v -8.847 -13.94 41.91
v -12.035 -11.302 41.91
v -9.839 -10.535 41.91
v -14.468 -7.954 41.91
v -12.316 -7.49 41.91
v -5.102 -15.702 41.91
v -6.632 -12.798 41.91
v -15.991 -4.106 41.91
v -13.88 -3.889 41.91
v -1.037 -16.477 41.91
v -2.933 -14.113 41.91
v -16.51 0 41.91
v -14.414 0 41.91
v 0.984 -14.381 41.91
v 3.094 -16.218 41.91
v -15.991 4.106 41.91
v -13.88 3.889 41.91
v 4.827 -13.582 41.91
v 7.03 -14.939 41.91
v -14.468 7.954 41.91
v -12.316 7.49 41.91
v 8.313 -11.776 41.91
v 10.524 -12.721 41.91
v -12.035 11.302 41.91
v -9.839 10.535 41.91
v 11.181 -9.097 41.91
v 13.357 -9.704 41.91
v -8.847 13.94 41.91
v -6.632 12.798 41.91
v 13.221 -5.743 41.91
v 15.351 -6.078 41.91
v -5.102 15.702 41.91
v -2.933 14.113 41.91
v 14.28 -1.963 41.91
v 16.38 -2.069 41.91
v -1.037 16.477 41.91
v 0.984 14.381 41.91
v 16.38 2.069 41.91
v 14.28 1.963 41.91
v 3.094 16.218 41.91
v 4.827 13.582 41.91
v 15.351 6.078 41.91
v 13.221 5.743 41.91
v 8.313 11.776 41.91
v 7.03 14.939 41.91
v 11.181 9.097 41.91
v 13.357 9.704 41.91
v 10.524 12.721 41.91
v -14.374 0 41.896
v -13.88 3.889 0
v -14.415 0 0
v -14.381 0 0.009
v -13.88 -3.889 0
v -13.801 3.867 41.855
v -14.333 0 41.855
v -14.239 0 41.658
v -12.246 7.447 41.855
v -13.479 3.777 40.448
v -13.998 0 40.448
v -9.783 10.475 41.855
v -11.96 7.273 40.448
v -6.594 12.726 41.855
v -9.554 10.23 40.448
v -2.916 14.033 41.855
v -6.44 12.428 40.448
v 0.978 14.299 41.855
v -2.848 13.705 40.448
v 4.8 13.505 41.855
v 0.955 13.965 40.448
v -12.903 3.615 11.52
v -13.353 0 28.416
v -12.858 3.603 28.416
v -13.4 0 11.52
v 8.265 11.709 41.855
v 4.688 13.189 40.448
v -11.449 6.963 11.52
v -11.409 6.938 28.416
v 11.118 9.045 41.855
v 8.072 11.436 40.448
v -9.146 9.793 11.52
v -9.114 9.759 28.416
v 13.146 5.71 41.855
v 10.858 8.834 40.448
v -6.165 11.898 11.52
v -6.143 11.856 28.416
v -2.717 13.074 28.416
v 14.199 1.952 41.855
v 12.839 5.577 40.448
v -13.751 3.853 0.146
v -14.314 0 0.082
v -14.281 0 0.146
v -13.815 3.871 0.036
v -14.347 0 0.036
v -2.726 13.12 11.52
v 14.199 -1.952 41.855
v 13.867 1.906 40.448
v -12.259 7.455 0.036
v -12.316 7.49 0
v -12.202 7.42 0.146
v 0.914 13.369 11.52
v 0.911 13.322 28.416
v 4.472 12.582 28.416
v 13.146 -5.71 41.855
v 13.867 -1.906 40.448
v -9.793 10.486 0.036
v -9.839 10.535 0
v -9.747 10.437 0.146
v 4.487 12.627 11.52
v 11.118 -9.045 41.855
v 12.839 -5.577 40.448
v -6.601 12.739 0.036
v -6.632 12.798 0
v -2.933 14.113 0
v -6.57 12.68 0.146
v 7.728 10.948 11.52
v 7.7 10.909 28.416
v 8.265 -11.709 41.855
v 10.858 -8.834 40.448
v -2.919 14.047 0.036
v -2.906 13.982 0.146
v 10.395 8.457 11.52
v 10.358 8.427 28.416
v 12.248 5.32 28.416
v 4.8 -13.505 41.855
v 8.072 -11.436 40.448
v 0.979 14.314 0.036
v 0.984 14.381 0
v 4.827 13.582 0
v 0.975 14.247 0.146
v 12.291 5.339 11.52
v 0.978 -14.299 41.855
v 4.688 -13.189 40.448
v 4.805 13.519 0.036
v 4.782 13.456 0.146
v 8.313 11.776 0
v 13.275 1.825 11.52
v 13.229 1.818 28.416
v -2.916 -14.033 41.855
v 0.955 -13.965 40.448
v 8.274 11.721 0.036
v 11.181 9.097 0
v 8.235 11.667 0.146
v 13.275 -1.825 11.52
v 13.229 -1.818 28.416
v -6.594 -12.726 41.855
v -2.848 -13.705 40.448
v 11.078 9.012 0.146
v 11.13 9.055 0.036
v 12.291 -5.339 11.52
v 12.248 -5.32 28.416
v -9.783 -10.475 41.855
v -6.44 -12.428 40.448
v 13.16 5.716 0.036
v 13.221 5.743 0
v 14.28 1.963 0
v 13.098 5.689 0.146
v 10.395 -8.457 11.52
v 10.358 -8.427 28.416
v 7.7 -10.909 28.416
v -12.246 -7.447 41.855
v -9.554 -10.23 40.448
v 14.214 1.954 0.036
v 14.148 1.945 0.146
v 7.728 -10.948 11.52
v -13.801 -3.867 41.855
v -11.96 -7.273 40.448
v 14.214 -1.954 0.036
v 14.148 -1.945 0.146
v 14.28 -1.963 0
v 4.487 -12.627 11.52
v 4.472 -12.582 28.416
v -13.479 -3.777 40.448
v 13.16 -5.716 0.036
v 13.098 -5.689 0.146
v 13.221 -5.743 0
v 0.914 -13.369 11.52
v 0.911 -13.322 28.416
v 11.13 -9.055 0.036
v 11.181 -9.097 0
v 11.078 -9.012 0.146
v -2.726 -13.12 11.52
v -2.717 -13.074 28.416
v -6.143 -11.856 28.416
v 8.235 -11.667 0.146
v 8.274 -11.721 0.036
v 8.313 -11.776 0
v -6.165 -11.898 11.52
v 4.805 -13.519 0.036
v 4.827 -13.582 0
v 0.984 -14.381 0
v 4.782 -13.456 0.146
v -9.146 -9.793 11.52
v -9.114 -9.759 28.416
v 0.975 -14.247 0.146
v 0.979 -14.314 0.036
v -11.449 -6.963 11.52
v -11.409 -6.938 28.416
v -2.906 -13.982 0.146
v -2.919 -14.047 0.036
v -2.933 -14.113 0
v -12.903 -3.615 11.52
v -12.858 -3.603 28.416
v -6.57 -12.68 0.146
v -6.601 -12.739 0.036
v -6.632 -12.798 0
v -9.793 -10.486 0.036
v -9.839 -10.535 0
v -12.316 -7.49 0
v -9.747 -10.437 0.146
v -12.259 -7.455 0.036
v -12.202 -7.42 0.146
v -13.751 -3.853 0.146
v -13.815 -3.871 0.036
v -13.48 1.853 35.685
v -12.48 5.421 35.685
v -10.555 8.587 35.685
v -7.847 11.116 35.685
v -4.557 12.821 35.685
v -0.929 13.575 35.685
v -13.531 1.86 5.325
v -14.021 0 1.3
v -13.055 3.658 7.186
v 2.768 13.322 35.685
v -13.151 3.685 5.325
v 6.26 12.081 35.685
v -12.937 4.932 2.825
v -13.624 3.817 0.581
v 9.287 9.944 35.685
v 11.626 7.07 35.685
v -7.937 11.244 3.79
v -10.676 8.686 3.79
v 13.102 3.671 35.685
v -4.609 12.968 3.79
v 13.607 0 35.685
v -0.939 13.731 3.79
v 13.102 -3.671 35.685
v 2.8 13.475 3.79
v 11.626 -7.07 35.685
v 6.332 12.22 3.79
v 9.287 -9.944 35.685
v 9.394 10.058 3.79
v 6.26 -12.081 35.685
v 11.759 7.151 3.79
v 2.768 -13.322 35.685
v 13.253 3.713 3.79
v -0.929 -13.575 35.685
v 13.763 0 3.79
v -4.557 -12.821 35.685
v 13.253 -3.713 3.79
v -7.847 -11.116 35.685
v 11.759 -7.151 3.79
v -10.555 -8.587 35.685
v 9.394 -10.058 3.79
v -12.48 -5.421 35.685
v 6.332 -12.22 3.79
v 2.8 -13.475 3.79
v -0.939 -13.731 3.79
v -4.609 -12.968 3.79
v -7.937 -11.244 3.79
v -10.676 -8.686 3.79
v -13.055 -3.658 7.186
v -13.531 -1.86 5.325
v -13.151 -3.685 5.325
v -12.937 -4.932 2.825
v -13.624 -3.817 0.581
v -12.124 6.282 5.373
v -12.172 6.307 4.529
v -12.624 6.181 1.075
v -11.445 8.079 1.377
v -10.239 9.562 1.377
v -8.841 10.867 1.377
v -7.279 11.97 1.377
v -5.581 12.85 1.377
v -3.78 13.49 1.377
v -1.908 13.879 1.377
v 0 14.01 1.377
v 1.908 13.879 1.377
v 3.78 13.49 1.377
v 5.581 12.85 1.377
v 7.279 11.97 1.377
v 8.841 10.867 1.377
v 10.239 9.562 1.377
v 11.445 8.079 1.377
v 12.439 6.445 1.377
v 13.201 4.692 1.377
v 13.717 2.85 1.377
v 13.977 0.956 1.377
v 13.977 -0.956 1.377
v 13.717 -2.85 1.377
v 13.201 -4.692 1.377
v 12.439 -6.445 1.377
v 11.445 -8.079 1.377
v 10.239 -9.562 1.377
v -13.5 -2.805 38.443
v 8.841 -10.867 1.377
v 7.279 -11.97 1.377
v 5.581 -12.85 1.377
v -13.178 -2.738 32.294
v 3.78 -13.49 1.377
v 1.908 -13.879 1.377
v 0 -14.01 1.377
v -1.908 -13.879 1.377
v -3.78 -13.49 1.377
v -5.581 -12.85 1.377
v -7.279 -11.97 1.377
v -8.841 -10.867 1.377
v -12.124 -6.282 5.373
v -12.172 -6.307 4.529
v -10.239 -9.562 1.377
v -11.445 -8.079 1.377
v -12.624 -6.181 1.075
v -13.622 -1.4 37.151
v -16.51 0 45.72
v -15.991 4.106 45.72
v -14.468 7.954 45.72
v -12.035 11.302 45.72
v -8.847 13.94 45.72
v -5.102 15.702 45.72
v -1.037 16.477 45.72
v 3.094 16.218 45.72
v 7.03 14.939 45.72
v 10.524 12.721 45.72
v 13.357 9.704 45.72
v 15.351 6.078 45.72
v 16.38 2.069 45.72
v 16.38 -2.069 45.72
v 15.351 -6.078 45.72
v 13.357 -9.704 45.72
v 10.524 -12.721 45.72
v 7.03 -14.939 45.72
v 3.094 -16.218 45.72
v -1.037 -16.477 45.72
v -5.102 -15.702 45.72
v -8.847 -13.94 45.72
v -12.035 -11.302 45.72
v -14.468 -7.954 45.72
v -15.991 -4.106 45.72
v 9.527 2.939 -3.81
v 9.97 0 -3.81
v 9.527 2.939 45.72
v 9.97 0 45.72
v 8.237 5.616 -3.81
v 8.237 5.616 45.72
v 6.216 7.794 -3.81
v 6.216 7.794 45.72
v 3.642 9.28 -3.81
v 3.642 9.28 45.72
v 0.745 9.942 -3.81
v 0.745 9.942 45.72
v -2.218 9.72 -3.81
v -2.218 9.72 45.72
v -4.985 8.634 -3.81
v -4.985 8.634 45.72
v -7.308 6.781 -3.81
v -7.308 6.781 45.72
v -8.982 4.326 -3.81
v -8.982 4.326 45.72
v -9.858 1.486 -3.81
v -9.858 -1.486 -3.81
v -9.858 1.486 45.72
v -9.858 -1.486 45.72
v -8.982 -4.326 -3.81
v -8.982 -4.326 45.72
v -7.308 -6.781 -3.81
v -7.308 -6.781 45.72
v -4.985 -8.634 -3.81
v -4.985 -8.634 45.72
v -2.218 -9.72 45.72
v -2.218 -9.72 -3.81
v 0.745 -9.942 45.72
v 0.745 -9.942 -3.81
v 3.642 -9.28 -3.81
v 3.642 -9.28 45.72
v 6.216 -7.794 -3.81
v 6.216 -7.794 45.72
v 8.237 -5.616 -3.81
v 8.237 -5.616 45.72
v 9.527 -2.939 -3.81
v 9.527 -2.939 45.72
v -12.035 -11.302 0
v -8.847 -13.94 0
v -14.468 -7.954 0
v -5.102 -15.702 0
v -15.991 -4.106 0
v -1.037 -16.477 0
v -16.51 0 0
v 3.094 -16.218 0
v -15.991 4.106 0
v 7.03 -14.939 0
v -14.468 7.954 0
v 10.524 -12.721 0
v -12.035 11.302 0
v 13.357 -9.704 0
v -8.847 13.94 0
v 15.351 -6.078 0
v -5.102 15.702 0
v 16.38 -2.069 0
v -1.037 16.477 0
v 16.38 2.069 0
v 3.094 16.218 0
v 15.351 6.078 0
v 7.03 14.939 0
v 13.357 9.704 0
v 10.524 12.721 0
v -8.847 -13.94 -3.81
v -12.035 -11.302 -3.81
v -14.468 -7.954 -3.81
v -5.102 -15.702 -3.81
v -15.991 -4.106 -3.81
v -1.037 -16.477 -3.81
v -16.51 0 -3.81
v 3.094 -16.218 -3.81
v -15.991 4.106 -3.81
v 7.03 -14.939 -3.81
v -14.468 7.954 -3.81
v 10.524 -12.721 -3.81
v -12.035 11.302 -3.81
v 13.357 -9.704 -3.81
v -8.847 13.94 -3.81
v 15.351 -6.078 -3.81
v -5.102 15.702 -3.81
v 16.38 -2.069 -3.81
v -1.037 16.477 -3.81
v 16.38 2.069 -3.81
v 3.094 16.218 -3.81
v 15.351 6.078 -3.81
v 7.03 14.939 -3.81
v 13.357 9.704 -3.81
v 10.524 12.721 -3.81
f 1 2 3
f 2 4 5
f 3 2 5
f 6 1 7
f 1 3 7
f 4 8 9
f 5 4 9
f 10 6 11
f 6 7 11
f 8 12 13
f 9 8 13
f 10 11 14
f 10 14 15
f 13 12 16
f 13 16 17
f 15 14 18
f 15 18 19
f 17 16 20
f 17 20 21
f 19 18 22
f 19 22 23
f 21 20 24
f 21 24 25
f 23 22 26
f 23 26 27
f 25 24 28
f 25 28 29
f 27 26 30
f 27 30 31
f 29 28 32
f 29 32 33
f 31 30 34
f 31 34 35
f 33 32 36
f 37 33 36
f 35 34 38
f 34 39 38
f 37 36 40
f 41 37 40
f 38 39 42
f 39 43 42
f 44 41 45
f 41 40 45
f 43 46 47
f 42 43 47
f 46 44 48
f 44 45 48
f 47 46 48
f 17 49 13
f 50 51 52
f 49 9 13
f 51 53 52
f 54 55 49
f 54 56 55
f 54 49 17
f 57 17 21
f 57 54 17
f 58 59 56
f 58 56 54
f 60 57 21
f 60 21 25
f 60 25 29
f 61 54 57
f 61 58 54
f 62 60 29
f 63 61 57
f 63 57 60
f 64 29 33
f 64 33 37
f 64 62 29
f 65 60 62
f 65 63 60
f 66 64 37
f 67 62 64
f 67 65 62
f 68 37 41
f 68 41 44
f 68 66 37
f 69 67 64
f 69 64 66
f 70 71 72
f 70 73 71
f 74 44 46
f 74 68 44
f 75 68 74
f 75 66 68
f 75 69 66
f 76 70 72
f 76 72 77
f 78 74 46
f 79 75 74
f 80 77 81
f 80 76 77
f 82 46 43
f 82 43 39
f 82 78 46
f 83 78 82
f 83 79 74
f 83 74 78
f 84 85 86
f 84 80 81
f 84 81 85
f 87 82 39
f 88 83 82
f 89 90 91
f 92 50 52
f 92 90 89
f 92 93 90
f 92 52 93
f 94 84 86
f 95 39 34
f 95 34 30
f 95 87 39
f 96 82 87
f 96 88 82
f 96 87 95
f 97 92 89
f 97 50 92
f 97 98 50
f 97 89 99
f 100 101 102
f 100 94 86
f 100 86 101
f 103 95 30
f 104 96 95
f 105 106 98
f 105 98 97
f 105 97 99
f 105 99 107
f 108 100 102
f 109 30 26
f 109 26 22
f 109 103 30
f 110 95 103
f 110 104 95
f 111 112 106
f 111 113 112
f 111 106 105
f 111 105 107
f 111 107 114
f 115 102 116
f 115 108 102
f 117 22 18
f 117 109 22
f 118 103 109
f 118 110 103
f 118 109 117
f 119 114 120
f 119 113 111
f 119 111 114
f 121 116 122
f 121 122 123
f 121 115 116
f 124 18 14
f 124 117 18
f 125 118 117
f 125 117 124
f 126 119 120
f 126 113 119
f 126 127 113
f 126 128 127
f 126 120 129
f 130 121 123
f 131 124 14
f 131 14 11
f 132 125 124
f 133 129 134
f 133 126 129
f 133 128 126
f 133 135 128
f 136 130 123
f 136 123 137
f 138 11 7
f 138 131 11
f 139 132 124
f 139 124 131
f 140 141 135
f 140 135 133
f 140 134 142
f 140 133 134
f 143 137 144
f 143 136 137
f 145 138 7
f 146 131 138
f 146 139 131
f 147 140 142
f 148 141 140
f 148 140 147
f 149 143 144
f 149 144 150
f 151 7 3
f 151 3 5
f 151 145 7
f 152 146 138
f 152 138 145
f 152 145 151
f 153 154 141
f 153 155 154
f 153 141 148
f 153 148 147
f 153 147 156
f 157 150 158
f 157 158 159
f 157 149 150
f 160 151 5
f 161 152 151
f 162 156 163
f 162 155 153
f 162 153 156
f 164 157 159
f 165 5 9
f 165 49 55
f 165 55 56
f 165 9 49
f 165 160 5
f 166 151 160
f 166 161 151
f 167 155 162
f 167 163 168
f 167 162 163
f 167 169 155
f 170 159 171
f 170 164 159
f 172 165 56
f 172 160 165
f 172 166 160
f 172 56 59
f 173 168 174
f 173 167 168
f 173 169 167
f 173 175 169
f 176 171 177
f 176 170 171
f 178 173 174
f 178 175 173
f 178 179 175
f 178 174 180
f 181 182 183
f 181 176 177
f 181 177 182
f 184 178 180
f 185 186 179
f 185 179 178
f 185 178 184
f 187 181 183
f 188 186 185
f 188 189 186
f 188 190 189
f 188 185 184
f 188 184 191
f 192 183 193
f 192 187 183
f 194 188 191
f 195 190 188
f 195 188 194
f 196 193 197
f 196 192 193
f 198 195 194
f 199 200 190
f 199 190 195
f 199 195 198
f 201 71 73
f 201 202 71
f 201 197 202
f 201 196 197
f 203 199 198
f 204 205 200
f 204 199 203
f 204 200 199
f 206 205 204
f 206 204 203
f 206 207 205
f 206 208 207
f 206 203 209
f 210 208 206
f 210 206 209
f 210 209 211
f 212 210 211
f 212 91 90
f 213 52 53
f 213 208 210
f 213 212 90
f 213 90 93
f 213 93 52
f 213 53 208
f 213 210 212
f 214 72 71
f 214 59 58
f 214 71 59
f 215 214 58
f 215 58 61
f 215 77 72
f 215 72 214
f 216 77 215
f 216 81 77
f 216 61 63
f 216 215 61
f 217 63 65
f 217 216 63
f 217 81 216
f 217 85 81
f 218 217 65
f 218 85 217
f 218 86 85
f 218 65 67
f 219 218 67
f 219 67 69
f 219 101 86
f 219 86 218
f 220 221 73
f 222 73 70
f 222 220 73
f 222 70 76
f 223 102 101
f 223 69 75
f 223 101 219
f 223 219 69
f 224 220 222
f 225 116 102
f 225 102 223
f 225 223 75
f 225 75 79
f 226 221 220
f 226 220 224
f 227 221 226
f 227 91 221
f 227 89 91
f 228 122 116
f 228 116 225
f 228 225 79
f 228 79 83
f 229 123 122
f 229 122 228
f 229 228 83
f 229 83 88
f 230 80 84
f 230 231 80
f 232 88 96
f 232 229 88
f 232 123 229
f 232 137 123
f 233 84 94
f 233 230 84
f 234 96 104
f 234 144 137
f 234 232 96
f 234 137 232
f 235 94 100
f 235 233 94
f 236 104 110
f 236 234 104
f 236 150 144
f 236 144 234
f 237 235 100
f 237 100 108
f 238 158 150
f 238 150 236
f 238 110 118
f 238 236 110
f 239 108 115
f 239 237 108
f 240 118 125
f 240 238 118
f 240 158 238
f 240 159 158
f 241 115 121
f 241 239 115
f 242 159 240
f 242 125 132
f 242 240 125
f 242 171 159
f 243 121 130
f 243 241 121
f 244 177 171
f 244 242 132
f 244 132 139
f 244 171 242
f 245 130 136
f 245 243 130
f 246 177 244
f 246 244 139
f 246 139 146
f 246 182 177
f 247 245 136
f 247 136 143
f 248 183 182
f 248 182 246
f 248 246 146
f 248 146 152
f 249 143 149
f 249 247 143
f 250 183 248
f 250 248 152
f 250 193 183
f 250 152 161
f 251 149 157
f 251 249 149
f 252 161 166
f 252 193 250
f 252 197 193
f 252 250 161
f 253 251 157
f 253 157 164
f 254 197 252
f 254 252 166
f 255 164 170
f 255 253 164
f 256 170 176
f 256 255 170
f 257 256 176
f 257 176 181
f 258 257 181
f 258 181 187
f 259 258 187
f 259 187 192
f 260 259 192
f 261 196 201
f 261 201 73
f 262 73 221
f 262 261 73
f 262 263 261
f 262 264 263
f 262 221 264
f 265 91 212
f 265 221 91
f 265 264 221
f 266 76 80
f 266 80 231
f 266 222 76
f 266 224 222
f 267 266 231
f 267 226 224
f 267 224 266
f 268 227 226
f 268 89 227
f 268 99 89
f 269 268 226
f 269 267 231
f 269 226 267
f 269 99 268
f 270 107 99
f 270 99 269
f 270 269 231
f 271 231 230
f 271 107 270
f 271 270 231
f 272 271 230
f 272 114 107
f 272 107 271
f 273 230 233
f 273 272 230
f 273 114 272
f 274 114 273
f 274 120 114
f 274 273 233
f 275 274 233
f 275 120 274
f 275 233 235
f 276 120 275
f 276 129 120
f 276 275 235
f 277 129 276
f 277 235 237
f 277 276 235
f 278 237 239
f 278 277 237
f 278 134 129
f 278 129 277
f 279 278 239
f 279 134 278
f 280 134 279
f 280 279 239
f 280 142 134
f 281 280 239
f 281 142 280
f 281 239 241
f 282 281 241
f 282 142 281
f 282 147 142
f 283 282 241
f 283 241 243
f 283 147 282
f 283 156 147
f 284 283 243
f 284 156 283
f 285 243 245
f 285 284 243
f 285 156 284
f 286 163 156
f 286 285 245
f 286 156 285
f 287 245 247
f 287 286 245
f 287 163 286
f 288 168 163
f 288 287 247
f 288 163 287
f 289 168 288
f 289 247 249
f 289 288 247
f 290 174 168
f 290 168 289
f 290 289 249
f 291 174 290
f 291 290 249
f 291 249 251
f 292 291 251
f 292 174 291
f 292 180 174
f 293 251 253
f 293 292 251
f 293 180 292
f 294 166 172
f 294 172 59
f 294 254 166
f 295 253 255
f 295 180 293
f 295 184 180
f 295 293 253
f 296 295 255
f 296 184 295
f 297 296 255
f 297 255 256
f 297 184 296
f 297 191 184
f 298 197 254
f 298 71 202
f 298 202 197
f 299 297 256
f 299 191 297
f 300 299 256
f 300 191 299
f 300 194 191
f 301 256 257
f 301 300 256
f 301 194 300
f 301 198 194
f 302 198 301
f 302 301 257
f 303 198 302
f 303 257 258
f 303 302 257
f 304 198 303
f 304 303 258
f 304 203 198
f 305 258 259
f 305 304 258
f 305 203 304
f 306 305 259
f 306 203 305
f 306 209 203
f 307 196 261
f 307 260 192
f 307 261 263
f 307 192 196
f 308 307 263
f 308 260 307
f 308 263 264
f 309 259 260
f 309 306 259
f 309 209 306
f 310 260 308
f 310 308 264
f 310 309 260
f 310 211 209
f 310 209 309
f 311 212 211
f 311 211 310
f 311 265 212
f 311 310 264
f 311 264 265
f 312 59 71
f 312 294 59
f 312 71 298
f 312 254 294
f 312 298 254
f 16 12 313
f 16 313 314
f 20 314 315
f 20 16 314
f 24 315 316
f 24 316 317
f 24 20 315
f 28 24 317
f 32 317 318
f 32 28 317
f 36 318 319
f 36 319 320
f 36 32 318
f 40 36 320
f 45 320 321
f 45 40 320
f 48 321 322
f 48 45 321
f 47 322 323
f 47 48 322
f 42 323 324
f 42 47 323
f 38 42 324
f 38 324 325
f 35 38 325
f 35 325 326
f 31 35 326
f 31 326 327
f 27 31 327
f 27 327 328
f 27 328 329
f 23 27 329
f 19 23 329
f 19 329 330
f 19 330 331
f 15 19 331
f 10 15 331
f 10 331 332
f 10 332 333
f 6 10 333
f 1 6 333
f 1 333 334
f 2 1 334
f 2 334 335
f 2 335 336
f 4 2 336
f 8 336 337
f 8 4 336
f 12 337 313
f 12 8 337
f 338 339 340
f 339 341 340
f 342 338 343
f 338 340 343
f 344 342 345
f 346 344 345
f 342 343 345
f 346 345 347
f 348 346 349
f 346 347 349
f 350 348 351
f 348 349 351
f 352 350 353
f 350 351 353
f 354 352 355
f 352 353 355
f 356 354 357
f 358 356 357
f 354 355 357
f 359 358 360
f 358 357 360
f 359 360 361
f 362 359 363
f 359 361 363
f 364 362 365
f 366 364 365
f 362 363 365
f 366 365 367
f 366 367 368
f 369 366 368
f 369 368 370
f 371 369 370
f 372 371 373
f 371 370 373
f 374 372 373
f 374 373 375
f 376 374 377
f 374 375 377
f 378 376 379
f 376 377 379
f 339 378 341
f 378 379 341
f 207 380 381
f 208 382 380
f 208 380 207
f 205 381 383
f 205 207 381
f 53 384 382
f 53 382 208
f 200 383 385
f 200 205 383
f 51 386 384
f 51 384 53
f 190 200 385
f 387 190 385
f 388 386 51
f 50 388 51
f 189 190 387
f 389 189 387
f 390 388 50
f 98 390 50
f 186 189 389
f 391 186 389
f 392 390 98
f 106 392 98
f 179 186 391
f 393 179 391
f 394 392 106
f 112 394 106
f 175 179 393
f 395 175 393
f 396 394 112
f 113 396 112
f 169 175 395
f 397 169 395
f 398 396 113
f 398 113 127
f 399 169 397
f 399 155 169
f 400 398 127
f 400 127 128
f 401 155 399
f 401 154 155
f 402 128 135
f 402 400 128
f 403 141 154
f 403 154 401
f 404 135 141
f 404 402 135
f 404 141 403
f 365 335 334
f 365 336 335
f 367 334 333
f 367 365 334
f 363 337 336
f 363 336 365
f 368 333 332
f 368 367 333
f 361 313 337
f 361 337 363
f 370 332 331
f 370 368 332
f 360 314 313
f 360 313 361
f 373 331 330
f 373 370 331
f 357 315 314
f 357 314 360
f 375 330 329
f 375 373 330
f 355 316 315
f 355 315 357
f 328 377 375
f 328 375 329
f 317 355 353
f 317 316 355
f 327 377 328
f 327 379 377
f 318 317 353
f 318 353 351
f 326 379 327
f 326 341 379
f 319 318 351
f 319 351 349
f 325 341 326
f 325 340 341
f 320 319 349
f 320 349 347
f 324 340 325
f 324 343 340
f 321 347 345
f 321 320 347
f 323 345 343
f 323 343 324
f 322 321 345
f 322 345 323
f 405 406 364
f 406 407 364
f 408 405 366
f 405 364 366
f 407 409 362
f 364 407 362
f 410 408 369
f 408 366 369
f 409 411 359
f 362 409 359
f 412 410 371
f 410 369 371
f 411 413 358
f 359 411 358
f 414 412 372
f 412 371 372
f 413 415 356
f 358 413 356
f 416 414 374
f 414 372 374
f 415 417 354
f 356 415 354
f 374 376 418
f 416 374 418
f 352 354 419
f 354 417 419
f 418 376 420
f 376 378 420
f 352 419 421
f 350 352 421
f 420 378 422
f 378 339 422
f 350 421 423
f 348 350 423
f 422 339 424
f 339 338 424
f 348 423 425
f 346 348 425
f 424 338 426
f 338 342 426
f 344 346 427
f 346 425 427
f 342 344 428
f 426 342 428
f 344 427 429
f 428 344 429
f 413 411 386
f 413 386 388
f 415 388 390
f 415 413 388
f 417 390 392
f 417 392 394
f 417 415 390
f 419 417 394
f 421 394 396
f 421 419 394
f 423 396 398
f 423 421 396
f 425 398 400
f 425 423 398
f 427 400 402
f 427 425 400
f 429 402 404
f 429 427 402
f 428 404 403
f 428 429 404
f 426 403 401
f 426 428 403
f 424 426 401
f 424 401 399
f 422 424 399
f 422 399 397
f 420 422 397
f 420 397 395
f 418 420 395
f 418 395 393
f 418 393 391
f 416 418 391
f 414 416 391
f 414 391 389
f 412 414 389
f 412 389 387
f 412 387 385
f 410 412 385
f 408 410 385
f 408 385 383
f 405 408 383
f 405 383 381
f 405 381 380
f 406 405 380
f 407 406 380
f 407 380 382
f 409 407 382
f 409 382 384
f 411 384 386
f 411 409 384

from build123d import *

# Parameters (mm, degrees)
SKETCH1_R           = 14.4145
SKETCH1_R_2         = 9.9695
BOSS_EXTRUDE1_DEPTH = 41.91
SKETCH2_R           = 19.05
SKETCH2_R_2         = 9.9695
BOSS_EXTRUDE2_DEPTH = 3.81
FILLET1_R           = 1.778
SKETCH3_RX          = 20.955
SKETCH3_RY          = 1.135862225
SKETCH4_R           = 19.05
SKETCH4_R_2         = 16.51
RIM_CUT_DEPTH       = 50.53


with BuildPart() as part:
    # Sketch1 → Boss-Extrude1 (new body)
    with BuildSketch(Plane.XY):
        Circle(SKETCH1_R)
        Circle(SKETCH1_R_2, mode=Mode.SUBTRACT)
    extrude(amount=BOSS_EXTRUDE1_DEPTH)

    # Sketch2 → Boss-Extrude2 (add)
    with BuildSketch(Plane.XY.offset(41.91)):
        Circle(SKETCH2_R)
        Circle(SKETCH2_R_2, mode=Mode.SUBTRACT)
    boss_extrude2 = extrude(amount=BOSS_EXTRUDE2_DEPTH)

    # Mirror1: Boss-Extrude2 across plane
    add(boss_extrude2.mirror(Plane.XY.offset(20.955)))

    # Fillet1
    fillet1_edges = [part.edges().sort_by_distance(p)[0] for p in [
        (-19.05, 0, 41.91),
        (-19.05, 0, 0),
    ]]
    fillet(fillet1_edges, radius=FILLET1_R)

    # Sketch3 → Cut-Revolve1 (revolve, cut)
    with BuildSketch(Plane(origin=(0, 0, 0), x_dir=(1, 0, 0), z_dir=(0, 1, 0))):
        with Locations(Location((-14.4145, -20.955), (0, 0, -90))):
            Ellipse(SKETCH3_RX, SKETCH3_RY)
    revolve(axis=Axis((0, 0, 45.72), (0, 0, -1)), mode=Mode.SUBTRACT)

    # Sketch4 → Rim_Cut (cut, through all)
    with BuildSketch(Plane(origin=(0, 0, -3.81), x_dir=(-1, 0, 0), z_dir=(0, 0, -1))):
        Circle(SKETCH4_R)
        Circle(SKETCH4_R_2, mode=Mode.SUBTRACT)
    extrude(amount=-RIM_CUT_DEPTH, mode=Mode.SUBTRACT)


solid = part.part
